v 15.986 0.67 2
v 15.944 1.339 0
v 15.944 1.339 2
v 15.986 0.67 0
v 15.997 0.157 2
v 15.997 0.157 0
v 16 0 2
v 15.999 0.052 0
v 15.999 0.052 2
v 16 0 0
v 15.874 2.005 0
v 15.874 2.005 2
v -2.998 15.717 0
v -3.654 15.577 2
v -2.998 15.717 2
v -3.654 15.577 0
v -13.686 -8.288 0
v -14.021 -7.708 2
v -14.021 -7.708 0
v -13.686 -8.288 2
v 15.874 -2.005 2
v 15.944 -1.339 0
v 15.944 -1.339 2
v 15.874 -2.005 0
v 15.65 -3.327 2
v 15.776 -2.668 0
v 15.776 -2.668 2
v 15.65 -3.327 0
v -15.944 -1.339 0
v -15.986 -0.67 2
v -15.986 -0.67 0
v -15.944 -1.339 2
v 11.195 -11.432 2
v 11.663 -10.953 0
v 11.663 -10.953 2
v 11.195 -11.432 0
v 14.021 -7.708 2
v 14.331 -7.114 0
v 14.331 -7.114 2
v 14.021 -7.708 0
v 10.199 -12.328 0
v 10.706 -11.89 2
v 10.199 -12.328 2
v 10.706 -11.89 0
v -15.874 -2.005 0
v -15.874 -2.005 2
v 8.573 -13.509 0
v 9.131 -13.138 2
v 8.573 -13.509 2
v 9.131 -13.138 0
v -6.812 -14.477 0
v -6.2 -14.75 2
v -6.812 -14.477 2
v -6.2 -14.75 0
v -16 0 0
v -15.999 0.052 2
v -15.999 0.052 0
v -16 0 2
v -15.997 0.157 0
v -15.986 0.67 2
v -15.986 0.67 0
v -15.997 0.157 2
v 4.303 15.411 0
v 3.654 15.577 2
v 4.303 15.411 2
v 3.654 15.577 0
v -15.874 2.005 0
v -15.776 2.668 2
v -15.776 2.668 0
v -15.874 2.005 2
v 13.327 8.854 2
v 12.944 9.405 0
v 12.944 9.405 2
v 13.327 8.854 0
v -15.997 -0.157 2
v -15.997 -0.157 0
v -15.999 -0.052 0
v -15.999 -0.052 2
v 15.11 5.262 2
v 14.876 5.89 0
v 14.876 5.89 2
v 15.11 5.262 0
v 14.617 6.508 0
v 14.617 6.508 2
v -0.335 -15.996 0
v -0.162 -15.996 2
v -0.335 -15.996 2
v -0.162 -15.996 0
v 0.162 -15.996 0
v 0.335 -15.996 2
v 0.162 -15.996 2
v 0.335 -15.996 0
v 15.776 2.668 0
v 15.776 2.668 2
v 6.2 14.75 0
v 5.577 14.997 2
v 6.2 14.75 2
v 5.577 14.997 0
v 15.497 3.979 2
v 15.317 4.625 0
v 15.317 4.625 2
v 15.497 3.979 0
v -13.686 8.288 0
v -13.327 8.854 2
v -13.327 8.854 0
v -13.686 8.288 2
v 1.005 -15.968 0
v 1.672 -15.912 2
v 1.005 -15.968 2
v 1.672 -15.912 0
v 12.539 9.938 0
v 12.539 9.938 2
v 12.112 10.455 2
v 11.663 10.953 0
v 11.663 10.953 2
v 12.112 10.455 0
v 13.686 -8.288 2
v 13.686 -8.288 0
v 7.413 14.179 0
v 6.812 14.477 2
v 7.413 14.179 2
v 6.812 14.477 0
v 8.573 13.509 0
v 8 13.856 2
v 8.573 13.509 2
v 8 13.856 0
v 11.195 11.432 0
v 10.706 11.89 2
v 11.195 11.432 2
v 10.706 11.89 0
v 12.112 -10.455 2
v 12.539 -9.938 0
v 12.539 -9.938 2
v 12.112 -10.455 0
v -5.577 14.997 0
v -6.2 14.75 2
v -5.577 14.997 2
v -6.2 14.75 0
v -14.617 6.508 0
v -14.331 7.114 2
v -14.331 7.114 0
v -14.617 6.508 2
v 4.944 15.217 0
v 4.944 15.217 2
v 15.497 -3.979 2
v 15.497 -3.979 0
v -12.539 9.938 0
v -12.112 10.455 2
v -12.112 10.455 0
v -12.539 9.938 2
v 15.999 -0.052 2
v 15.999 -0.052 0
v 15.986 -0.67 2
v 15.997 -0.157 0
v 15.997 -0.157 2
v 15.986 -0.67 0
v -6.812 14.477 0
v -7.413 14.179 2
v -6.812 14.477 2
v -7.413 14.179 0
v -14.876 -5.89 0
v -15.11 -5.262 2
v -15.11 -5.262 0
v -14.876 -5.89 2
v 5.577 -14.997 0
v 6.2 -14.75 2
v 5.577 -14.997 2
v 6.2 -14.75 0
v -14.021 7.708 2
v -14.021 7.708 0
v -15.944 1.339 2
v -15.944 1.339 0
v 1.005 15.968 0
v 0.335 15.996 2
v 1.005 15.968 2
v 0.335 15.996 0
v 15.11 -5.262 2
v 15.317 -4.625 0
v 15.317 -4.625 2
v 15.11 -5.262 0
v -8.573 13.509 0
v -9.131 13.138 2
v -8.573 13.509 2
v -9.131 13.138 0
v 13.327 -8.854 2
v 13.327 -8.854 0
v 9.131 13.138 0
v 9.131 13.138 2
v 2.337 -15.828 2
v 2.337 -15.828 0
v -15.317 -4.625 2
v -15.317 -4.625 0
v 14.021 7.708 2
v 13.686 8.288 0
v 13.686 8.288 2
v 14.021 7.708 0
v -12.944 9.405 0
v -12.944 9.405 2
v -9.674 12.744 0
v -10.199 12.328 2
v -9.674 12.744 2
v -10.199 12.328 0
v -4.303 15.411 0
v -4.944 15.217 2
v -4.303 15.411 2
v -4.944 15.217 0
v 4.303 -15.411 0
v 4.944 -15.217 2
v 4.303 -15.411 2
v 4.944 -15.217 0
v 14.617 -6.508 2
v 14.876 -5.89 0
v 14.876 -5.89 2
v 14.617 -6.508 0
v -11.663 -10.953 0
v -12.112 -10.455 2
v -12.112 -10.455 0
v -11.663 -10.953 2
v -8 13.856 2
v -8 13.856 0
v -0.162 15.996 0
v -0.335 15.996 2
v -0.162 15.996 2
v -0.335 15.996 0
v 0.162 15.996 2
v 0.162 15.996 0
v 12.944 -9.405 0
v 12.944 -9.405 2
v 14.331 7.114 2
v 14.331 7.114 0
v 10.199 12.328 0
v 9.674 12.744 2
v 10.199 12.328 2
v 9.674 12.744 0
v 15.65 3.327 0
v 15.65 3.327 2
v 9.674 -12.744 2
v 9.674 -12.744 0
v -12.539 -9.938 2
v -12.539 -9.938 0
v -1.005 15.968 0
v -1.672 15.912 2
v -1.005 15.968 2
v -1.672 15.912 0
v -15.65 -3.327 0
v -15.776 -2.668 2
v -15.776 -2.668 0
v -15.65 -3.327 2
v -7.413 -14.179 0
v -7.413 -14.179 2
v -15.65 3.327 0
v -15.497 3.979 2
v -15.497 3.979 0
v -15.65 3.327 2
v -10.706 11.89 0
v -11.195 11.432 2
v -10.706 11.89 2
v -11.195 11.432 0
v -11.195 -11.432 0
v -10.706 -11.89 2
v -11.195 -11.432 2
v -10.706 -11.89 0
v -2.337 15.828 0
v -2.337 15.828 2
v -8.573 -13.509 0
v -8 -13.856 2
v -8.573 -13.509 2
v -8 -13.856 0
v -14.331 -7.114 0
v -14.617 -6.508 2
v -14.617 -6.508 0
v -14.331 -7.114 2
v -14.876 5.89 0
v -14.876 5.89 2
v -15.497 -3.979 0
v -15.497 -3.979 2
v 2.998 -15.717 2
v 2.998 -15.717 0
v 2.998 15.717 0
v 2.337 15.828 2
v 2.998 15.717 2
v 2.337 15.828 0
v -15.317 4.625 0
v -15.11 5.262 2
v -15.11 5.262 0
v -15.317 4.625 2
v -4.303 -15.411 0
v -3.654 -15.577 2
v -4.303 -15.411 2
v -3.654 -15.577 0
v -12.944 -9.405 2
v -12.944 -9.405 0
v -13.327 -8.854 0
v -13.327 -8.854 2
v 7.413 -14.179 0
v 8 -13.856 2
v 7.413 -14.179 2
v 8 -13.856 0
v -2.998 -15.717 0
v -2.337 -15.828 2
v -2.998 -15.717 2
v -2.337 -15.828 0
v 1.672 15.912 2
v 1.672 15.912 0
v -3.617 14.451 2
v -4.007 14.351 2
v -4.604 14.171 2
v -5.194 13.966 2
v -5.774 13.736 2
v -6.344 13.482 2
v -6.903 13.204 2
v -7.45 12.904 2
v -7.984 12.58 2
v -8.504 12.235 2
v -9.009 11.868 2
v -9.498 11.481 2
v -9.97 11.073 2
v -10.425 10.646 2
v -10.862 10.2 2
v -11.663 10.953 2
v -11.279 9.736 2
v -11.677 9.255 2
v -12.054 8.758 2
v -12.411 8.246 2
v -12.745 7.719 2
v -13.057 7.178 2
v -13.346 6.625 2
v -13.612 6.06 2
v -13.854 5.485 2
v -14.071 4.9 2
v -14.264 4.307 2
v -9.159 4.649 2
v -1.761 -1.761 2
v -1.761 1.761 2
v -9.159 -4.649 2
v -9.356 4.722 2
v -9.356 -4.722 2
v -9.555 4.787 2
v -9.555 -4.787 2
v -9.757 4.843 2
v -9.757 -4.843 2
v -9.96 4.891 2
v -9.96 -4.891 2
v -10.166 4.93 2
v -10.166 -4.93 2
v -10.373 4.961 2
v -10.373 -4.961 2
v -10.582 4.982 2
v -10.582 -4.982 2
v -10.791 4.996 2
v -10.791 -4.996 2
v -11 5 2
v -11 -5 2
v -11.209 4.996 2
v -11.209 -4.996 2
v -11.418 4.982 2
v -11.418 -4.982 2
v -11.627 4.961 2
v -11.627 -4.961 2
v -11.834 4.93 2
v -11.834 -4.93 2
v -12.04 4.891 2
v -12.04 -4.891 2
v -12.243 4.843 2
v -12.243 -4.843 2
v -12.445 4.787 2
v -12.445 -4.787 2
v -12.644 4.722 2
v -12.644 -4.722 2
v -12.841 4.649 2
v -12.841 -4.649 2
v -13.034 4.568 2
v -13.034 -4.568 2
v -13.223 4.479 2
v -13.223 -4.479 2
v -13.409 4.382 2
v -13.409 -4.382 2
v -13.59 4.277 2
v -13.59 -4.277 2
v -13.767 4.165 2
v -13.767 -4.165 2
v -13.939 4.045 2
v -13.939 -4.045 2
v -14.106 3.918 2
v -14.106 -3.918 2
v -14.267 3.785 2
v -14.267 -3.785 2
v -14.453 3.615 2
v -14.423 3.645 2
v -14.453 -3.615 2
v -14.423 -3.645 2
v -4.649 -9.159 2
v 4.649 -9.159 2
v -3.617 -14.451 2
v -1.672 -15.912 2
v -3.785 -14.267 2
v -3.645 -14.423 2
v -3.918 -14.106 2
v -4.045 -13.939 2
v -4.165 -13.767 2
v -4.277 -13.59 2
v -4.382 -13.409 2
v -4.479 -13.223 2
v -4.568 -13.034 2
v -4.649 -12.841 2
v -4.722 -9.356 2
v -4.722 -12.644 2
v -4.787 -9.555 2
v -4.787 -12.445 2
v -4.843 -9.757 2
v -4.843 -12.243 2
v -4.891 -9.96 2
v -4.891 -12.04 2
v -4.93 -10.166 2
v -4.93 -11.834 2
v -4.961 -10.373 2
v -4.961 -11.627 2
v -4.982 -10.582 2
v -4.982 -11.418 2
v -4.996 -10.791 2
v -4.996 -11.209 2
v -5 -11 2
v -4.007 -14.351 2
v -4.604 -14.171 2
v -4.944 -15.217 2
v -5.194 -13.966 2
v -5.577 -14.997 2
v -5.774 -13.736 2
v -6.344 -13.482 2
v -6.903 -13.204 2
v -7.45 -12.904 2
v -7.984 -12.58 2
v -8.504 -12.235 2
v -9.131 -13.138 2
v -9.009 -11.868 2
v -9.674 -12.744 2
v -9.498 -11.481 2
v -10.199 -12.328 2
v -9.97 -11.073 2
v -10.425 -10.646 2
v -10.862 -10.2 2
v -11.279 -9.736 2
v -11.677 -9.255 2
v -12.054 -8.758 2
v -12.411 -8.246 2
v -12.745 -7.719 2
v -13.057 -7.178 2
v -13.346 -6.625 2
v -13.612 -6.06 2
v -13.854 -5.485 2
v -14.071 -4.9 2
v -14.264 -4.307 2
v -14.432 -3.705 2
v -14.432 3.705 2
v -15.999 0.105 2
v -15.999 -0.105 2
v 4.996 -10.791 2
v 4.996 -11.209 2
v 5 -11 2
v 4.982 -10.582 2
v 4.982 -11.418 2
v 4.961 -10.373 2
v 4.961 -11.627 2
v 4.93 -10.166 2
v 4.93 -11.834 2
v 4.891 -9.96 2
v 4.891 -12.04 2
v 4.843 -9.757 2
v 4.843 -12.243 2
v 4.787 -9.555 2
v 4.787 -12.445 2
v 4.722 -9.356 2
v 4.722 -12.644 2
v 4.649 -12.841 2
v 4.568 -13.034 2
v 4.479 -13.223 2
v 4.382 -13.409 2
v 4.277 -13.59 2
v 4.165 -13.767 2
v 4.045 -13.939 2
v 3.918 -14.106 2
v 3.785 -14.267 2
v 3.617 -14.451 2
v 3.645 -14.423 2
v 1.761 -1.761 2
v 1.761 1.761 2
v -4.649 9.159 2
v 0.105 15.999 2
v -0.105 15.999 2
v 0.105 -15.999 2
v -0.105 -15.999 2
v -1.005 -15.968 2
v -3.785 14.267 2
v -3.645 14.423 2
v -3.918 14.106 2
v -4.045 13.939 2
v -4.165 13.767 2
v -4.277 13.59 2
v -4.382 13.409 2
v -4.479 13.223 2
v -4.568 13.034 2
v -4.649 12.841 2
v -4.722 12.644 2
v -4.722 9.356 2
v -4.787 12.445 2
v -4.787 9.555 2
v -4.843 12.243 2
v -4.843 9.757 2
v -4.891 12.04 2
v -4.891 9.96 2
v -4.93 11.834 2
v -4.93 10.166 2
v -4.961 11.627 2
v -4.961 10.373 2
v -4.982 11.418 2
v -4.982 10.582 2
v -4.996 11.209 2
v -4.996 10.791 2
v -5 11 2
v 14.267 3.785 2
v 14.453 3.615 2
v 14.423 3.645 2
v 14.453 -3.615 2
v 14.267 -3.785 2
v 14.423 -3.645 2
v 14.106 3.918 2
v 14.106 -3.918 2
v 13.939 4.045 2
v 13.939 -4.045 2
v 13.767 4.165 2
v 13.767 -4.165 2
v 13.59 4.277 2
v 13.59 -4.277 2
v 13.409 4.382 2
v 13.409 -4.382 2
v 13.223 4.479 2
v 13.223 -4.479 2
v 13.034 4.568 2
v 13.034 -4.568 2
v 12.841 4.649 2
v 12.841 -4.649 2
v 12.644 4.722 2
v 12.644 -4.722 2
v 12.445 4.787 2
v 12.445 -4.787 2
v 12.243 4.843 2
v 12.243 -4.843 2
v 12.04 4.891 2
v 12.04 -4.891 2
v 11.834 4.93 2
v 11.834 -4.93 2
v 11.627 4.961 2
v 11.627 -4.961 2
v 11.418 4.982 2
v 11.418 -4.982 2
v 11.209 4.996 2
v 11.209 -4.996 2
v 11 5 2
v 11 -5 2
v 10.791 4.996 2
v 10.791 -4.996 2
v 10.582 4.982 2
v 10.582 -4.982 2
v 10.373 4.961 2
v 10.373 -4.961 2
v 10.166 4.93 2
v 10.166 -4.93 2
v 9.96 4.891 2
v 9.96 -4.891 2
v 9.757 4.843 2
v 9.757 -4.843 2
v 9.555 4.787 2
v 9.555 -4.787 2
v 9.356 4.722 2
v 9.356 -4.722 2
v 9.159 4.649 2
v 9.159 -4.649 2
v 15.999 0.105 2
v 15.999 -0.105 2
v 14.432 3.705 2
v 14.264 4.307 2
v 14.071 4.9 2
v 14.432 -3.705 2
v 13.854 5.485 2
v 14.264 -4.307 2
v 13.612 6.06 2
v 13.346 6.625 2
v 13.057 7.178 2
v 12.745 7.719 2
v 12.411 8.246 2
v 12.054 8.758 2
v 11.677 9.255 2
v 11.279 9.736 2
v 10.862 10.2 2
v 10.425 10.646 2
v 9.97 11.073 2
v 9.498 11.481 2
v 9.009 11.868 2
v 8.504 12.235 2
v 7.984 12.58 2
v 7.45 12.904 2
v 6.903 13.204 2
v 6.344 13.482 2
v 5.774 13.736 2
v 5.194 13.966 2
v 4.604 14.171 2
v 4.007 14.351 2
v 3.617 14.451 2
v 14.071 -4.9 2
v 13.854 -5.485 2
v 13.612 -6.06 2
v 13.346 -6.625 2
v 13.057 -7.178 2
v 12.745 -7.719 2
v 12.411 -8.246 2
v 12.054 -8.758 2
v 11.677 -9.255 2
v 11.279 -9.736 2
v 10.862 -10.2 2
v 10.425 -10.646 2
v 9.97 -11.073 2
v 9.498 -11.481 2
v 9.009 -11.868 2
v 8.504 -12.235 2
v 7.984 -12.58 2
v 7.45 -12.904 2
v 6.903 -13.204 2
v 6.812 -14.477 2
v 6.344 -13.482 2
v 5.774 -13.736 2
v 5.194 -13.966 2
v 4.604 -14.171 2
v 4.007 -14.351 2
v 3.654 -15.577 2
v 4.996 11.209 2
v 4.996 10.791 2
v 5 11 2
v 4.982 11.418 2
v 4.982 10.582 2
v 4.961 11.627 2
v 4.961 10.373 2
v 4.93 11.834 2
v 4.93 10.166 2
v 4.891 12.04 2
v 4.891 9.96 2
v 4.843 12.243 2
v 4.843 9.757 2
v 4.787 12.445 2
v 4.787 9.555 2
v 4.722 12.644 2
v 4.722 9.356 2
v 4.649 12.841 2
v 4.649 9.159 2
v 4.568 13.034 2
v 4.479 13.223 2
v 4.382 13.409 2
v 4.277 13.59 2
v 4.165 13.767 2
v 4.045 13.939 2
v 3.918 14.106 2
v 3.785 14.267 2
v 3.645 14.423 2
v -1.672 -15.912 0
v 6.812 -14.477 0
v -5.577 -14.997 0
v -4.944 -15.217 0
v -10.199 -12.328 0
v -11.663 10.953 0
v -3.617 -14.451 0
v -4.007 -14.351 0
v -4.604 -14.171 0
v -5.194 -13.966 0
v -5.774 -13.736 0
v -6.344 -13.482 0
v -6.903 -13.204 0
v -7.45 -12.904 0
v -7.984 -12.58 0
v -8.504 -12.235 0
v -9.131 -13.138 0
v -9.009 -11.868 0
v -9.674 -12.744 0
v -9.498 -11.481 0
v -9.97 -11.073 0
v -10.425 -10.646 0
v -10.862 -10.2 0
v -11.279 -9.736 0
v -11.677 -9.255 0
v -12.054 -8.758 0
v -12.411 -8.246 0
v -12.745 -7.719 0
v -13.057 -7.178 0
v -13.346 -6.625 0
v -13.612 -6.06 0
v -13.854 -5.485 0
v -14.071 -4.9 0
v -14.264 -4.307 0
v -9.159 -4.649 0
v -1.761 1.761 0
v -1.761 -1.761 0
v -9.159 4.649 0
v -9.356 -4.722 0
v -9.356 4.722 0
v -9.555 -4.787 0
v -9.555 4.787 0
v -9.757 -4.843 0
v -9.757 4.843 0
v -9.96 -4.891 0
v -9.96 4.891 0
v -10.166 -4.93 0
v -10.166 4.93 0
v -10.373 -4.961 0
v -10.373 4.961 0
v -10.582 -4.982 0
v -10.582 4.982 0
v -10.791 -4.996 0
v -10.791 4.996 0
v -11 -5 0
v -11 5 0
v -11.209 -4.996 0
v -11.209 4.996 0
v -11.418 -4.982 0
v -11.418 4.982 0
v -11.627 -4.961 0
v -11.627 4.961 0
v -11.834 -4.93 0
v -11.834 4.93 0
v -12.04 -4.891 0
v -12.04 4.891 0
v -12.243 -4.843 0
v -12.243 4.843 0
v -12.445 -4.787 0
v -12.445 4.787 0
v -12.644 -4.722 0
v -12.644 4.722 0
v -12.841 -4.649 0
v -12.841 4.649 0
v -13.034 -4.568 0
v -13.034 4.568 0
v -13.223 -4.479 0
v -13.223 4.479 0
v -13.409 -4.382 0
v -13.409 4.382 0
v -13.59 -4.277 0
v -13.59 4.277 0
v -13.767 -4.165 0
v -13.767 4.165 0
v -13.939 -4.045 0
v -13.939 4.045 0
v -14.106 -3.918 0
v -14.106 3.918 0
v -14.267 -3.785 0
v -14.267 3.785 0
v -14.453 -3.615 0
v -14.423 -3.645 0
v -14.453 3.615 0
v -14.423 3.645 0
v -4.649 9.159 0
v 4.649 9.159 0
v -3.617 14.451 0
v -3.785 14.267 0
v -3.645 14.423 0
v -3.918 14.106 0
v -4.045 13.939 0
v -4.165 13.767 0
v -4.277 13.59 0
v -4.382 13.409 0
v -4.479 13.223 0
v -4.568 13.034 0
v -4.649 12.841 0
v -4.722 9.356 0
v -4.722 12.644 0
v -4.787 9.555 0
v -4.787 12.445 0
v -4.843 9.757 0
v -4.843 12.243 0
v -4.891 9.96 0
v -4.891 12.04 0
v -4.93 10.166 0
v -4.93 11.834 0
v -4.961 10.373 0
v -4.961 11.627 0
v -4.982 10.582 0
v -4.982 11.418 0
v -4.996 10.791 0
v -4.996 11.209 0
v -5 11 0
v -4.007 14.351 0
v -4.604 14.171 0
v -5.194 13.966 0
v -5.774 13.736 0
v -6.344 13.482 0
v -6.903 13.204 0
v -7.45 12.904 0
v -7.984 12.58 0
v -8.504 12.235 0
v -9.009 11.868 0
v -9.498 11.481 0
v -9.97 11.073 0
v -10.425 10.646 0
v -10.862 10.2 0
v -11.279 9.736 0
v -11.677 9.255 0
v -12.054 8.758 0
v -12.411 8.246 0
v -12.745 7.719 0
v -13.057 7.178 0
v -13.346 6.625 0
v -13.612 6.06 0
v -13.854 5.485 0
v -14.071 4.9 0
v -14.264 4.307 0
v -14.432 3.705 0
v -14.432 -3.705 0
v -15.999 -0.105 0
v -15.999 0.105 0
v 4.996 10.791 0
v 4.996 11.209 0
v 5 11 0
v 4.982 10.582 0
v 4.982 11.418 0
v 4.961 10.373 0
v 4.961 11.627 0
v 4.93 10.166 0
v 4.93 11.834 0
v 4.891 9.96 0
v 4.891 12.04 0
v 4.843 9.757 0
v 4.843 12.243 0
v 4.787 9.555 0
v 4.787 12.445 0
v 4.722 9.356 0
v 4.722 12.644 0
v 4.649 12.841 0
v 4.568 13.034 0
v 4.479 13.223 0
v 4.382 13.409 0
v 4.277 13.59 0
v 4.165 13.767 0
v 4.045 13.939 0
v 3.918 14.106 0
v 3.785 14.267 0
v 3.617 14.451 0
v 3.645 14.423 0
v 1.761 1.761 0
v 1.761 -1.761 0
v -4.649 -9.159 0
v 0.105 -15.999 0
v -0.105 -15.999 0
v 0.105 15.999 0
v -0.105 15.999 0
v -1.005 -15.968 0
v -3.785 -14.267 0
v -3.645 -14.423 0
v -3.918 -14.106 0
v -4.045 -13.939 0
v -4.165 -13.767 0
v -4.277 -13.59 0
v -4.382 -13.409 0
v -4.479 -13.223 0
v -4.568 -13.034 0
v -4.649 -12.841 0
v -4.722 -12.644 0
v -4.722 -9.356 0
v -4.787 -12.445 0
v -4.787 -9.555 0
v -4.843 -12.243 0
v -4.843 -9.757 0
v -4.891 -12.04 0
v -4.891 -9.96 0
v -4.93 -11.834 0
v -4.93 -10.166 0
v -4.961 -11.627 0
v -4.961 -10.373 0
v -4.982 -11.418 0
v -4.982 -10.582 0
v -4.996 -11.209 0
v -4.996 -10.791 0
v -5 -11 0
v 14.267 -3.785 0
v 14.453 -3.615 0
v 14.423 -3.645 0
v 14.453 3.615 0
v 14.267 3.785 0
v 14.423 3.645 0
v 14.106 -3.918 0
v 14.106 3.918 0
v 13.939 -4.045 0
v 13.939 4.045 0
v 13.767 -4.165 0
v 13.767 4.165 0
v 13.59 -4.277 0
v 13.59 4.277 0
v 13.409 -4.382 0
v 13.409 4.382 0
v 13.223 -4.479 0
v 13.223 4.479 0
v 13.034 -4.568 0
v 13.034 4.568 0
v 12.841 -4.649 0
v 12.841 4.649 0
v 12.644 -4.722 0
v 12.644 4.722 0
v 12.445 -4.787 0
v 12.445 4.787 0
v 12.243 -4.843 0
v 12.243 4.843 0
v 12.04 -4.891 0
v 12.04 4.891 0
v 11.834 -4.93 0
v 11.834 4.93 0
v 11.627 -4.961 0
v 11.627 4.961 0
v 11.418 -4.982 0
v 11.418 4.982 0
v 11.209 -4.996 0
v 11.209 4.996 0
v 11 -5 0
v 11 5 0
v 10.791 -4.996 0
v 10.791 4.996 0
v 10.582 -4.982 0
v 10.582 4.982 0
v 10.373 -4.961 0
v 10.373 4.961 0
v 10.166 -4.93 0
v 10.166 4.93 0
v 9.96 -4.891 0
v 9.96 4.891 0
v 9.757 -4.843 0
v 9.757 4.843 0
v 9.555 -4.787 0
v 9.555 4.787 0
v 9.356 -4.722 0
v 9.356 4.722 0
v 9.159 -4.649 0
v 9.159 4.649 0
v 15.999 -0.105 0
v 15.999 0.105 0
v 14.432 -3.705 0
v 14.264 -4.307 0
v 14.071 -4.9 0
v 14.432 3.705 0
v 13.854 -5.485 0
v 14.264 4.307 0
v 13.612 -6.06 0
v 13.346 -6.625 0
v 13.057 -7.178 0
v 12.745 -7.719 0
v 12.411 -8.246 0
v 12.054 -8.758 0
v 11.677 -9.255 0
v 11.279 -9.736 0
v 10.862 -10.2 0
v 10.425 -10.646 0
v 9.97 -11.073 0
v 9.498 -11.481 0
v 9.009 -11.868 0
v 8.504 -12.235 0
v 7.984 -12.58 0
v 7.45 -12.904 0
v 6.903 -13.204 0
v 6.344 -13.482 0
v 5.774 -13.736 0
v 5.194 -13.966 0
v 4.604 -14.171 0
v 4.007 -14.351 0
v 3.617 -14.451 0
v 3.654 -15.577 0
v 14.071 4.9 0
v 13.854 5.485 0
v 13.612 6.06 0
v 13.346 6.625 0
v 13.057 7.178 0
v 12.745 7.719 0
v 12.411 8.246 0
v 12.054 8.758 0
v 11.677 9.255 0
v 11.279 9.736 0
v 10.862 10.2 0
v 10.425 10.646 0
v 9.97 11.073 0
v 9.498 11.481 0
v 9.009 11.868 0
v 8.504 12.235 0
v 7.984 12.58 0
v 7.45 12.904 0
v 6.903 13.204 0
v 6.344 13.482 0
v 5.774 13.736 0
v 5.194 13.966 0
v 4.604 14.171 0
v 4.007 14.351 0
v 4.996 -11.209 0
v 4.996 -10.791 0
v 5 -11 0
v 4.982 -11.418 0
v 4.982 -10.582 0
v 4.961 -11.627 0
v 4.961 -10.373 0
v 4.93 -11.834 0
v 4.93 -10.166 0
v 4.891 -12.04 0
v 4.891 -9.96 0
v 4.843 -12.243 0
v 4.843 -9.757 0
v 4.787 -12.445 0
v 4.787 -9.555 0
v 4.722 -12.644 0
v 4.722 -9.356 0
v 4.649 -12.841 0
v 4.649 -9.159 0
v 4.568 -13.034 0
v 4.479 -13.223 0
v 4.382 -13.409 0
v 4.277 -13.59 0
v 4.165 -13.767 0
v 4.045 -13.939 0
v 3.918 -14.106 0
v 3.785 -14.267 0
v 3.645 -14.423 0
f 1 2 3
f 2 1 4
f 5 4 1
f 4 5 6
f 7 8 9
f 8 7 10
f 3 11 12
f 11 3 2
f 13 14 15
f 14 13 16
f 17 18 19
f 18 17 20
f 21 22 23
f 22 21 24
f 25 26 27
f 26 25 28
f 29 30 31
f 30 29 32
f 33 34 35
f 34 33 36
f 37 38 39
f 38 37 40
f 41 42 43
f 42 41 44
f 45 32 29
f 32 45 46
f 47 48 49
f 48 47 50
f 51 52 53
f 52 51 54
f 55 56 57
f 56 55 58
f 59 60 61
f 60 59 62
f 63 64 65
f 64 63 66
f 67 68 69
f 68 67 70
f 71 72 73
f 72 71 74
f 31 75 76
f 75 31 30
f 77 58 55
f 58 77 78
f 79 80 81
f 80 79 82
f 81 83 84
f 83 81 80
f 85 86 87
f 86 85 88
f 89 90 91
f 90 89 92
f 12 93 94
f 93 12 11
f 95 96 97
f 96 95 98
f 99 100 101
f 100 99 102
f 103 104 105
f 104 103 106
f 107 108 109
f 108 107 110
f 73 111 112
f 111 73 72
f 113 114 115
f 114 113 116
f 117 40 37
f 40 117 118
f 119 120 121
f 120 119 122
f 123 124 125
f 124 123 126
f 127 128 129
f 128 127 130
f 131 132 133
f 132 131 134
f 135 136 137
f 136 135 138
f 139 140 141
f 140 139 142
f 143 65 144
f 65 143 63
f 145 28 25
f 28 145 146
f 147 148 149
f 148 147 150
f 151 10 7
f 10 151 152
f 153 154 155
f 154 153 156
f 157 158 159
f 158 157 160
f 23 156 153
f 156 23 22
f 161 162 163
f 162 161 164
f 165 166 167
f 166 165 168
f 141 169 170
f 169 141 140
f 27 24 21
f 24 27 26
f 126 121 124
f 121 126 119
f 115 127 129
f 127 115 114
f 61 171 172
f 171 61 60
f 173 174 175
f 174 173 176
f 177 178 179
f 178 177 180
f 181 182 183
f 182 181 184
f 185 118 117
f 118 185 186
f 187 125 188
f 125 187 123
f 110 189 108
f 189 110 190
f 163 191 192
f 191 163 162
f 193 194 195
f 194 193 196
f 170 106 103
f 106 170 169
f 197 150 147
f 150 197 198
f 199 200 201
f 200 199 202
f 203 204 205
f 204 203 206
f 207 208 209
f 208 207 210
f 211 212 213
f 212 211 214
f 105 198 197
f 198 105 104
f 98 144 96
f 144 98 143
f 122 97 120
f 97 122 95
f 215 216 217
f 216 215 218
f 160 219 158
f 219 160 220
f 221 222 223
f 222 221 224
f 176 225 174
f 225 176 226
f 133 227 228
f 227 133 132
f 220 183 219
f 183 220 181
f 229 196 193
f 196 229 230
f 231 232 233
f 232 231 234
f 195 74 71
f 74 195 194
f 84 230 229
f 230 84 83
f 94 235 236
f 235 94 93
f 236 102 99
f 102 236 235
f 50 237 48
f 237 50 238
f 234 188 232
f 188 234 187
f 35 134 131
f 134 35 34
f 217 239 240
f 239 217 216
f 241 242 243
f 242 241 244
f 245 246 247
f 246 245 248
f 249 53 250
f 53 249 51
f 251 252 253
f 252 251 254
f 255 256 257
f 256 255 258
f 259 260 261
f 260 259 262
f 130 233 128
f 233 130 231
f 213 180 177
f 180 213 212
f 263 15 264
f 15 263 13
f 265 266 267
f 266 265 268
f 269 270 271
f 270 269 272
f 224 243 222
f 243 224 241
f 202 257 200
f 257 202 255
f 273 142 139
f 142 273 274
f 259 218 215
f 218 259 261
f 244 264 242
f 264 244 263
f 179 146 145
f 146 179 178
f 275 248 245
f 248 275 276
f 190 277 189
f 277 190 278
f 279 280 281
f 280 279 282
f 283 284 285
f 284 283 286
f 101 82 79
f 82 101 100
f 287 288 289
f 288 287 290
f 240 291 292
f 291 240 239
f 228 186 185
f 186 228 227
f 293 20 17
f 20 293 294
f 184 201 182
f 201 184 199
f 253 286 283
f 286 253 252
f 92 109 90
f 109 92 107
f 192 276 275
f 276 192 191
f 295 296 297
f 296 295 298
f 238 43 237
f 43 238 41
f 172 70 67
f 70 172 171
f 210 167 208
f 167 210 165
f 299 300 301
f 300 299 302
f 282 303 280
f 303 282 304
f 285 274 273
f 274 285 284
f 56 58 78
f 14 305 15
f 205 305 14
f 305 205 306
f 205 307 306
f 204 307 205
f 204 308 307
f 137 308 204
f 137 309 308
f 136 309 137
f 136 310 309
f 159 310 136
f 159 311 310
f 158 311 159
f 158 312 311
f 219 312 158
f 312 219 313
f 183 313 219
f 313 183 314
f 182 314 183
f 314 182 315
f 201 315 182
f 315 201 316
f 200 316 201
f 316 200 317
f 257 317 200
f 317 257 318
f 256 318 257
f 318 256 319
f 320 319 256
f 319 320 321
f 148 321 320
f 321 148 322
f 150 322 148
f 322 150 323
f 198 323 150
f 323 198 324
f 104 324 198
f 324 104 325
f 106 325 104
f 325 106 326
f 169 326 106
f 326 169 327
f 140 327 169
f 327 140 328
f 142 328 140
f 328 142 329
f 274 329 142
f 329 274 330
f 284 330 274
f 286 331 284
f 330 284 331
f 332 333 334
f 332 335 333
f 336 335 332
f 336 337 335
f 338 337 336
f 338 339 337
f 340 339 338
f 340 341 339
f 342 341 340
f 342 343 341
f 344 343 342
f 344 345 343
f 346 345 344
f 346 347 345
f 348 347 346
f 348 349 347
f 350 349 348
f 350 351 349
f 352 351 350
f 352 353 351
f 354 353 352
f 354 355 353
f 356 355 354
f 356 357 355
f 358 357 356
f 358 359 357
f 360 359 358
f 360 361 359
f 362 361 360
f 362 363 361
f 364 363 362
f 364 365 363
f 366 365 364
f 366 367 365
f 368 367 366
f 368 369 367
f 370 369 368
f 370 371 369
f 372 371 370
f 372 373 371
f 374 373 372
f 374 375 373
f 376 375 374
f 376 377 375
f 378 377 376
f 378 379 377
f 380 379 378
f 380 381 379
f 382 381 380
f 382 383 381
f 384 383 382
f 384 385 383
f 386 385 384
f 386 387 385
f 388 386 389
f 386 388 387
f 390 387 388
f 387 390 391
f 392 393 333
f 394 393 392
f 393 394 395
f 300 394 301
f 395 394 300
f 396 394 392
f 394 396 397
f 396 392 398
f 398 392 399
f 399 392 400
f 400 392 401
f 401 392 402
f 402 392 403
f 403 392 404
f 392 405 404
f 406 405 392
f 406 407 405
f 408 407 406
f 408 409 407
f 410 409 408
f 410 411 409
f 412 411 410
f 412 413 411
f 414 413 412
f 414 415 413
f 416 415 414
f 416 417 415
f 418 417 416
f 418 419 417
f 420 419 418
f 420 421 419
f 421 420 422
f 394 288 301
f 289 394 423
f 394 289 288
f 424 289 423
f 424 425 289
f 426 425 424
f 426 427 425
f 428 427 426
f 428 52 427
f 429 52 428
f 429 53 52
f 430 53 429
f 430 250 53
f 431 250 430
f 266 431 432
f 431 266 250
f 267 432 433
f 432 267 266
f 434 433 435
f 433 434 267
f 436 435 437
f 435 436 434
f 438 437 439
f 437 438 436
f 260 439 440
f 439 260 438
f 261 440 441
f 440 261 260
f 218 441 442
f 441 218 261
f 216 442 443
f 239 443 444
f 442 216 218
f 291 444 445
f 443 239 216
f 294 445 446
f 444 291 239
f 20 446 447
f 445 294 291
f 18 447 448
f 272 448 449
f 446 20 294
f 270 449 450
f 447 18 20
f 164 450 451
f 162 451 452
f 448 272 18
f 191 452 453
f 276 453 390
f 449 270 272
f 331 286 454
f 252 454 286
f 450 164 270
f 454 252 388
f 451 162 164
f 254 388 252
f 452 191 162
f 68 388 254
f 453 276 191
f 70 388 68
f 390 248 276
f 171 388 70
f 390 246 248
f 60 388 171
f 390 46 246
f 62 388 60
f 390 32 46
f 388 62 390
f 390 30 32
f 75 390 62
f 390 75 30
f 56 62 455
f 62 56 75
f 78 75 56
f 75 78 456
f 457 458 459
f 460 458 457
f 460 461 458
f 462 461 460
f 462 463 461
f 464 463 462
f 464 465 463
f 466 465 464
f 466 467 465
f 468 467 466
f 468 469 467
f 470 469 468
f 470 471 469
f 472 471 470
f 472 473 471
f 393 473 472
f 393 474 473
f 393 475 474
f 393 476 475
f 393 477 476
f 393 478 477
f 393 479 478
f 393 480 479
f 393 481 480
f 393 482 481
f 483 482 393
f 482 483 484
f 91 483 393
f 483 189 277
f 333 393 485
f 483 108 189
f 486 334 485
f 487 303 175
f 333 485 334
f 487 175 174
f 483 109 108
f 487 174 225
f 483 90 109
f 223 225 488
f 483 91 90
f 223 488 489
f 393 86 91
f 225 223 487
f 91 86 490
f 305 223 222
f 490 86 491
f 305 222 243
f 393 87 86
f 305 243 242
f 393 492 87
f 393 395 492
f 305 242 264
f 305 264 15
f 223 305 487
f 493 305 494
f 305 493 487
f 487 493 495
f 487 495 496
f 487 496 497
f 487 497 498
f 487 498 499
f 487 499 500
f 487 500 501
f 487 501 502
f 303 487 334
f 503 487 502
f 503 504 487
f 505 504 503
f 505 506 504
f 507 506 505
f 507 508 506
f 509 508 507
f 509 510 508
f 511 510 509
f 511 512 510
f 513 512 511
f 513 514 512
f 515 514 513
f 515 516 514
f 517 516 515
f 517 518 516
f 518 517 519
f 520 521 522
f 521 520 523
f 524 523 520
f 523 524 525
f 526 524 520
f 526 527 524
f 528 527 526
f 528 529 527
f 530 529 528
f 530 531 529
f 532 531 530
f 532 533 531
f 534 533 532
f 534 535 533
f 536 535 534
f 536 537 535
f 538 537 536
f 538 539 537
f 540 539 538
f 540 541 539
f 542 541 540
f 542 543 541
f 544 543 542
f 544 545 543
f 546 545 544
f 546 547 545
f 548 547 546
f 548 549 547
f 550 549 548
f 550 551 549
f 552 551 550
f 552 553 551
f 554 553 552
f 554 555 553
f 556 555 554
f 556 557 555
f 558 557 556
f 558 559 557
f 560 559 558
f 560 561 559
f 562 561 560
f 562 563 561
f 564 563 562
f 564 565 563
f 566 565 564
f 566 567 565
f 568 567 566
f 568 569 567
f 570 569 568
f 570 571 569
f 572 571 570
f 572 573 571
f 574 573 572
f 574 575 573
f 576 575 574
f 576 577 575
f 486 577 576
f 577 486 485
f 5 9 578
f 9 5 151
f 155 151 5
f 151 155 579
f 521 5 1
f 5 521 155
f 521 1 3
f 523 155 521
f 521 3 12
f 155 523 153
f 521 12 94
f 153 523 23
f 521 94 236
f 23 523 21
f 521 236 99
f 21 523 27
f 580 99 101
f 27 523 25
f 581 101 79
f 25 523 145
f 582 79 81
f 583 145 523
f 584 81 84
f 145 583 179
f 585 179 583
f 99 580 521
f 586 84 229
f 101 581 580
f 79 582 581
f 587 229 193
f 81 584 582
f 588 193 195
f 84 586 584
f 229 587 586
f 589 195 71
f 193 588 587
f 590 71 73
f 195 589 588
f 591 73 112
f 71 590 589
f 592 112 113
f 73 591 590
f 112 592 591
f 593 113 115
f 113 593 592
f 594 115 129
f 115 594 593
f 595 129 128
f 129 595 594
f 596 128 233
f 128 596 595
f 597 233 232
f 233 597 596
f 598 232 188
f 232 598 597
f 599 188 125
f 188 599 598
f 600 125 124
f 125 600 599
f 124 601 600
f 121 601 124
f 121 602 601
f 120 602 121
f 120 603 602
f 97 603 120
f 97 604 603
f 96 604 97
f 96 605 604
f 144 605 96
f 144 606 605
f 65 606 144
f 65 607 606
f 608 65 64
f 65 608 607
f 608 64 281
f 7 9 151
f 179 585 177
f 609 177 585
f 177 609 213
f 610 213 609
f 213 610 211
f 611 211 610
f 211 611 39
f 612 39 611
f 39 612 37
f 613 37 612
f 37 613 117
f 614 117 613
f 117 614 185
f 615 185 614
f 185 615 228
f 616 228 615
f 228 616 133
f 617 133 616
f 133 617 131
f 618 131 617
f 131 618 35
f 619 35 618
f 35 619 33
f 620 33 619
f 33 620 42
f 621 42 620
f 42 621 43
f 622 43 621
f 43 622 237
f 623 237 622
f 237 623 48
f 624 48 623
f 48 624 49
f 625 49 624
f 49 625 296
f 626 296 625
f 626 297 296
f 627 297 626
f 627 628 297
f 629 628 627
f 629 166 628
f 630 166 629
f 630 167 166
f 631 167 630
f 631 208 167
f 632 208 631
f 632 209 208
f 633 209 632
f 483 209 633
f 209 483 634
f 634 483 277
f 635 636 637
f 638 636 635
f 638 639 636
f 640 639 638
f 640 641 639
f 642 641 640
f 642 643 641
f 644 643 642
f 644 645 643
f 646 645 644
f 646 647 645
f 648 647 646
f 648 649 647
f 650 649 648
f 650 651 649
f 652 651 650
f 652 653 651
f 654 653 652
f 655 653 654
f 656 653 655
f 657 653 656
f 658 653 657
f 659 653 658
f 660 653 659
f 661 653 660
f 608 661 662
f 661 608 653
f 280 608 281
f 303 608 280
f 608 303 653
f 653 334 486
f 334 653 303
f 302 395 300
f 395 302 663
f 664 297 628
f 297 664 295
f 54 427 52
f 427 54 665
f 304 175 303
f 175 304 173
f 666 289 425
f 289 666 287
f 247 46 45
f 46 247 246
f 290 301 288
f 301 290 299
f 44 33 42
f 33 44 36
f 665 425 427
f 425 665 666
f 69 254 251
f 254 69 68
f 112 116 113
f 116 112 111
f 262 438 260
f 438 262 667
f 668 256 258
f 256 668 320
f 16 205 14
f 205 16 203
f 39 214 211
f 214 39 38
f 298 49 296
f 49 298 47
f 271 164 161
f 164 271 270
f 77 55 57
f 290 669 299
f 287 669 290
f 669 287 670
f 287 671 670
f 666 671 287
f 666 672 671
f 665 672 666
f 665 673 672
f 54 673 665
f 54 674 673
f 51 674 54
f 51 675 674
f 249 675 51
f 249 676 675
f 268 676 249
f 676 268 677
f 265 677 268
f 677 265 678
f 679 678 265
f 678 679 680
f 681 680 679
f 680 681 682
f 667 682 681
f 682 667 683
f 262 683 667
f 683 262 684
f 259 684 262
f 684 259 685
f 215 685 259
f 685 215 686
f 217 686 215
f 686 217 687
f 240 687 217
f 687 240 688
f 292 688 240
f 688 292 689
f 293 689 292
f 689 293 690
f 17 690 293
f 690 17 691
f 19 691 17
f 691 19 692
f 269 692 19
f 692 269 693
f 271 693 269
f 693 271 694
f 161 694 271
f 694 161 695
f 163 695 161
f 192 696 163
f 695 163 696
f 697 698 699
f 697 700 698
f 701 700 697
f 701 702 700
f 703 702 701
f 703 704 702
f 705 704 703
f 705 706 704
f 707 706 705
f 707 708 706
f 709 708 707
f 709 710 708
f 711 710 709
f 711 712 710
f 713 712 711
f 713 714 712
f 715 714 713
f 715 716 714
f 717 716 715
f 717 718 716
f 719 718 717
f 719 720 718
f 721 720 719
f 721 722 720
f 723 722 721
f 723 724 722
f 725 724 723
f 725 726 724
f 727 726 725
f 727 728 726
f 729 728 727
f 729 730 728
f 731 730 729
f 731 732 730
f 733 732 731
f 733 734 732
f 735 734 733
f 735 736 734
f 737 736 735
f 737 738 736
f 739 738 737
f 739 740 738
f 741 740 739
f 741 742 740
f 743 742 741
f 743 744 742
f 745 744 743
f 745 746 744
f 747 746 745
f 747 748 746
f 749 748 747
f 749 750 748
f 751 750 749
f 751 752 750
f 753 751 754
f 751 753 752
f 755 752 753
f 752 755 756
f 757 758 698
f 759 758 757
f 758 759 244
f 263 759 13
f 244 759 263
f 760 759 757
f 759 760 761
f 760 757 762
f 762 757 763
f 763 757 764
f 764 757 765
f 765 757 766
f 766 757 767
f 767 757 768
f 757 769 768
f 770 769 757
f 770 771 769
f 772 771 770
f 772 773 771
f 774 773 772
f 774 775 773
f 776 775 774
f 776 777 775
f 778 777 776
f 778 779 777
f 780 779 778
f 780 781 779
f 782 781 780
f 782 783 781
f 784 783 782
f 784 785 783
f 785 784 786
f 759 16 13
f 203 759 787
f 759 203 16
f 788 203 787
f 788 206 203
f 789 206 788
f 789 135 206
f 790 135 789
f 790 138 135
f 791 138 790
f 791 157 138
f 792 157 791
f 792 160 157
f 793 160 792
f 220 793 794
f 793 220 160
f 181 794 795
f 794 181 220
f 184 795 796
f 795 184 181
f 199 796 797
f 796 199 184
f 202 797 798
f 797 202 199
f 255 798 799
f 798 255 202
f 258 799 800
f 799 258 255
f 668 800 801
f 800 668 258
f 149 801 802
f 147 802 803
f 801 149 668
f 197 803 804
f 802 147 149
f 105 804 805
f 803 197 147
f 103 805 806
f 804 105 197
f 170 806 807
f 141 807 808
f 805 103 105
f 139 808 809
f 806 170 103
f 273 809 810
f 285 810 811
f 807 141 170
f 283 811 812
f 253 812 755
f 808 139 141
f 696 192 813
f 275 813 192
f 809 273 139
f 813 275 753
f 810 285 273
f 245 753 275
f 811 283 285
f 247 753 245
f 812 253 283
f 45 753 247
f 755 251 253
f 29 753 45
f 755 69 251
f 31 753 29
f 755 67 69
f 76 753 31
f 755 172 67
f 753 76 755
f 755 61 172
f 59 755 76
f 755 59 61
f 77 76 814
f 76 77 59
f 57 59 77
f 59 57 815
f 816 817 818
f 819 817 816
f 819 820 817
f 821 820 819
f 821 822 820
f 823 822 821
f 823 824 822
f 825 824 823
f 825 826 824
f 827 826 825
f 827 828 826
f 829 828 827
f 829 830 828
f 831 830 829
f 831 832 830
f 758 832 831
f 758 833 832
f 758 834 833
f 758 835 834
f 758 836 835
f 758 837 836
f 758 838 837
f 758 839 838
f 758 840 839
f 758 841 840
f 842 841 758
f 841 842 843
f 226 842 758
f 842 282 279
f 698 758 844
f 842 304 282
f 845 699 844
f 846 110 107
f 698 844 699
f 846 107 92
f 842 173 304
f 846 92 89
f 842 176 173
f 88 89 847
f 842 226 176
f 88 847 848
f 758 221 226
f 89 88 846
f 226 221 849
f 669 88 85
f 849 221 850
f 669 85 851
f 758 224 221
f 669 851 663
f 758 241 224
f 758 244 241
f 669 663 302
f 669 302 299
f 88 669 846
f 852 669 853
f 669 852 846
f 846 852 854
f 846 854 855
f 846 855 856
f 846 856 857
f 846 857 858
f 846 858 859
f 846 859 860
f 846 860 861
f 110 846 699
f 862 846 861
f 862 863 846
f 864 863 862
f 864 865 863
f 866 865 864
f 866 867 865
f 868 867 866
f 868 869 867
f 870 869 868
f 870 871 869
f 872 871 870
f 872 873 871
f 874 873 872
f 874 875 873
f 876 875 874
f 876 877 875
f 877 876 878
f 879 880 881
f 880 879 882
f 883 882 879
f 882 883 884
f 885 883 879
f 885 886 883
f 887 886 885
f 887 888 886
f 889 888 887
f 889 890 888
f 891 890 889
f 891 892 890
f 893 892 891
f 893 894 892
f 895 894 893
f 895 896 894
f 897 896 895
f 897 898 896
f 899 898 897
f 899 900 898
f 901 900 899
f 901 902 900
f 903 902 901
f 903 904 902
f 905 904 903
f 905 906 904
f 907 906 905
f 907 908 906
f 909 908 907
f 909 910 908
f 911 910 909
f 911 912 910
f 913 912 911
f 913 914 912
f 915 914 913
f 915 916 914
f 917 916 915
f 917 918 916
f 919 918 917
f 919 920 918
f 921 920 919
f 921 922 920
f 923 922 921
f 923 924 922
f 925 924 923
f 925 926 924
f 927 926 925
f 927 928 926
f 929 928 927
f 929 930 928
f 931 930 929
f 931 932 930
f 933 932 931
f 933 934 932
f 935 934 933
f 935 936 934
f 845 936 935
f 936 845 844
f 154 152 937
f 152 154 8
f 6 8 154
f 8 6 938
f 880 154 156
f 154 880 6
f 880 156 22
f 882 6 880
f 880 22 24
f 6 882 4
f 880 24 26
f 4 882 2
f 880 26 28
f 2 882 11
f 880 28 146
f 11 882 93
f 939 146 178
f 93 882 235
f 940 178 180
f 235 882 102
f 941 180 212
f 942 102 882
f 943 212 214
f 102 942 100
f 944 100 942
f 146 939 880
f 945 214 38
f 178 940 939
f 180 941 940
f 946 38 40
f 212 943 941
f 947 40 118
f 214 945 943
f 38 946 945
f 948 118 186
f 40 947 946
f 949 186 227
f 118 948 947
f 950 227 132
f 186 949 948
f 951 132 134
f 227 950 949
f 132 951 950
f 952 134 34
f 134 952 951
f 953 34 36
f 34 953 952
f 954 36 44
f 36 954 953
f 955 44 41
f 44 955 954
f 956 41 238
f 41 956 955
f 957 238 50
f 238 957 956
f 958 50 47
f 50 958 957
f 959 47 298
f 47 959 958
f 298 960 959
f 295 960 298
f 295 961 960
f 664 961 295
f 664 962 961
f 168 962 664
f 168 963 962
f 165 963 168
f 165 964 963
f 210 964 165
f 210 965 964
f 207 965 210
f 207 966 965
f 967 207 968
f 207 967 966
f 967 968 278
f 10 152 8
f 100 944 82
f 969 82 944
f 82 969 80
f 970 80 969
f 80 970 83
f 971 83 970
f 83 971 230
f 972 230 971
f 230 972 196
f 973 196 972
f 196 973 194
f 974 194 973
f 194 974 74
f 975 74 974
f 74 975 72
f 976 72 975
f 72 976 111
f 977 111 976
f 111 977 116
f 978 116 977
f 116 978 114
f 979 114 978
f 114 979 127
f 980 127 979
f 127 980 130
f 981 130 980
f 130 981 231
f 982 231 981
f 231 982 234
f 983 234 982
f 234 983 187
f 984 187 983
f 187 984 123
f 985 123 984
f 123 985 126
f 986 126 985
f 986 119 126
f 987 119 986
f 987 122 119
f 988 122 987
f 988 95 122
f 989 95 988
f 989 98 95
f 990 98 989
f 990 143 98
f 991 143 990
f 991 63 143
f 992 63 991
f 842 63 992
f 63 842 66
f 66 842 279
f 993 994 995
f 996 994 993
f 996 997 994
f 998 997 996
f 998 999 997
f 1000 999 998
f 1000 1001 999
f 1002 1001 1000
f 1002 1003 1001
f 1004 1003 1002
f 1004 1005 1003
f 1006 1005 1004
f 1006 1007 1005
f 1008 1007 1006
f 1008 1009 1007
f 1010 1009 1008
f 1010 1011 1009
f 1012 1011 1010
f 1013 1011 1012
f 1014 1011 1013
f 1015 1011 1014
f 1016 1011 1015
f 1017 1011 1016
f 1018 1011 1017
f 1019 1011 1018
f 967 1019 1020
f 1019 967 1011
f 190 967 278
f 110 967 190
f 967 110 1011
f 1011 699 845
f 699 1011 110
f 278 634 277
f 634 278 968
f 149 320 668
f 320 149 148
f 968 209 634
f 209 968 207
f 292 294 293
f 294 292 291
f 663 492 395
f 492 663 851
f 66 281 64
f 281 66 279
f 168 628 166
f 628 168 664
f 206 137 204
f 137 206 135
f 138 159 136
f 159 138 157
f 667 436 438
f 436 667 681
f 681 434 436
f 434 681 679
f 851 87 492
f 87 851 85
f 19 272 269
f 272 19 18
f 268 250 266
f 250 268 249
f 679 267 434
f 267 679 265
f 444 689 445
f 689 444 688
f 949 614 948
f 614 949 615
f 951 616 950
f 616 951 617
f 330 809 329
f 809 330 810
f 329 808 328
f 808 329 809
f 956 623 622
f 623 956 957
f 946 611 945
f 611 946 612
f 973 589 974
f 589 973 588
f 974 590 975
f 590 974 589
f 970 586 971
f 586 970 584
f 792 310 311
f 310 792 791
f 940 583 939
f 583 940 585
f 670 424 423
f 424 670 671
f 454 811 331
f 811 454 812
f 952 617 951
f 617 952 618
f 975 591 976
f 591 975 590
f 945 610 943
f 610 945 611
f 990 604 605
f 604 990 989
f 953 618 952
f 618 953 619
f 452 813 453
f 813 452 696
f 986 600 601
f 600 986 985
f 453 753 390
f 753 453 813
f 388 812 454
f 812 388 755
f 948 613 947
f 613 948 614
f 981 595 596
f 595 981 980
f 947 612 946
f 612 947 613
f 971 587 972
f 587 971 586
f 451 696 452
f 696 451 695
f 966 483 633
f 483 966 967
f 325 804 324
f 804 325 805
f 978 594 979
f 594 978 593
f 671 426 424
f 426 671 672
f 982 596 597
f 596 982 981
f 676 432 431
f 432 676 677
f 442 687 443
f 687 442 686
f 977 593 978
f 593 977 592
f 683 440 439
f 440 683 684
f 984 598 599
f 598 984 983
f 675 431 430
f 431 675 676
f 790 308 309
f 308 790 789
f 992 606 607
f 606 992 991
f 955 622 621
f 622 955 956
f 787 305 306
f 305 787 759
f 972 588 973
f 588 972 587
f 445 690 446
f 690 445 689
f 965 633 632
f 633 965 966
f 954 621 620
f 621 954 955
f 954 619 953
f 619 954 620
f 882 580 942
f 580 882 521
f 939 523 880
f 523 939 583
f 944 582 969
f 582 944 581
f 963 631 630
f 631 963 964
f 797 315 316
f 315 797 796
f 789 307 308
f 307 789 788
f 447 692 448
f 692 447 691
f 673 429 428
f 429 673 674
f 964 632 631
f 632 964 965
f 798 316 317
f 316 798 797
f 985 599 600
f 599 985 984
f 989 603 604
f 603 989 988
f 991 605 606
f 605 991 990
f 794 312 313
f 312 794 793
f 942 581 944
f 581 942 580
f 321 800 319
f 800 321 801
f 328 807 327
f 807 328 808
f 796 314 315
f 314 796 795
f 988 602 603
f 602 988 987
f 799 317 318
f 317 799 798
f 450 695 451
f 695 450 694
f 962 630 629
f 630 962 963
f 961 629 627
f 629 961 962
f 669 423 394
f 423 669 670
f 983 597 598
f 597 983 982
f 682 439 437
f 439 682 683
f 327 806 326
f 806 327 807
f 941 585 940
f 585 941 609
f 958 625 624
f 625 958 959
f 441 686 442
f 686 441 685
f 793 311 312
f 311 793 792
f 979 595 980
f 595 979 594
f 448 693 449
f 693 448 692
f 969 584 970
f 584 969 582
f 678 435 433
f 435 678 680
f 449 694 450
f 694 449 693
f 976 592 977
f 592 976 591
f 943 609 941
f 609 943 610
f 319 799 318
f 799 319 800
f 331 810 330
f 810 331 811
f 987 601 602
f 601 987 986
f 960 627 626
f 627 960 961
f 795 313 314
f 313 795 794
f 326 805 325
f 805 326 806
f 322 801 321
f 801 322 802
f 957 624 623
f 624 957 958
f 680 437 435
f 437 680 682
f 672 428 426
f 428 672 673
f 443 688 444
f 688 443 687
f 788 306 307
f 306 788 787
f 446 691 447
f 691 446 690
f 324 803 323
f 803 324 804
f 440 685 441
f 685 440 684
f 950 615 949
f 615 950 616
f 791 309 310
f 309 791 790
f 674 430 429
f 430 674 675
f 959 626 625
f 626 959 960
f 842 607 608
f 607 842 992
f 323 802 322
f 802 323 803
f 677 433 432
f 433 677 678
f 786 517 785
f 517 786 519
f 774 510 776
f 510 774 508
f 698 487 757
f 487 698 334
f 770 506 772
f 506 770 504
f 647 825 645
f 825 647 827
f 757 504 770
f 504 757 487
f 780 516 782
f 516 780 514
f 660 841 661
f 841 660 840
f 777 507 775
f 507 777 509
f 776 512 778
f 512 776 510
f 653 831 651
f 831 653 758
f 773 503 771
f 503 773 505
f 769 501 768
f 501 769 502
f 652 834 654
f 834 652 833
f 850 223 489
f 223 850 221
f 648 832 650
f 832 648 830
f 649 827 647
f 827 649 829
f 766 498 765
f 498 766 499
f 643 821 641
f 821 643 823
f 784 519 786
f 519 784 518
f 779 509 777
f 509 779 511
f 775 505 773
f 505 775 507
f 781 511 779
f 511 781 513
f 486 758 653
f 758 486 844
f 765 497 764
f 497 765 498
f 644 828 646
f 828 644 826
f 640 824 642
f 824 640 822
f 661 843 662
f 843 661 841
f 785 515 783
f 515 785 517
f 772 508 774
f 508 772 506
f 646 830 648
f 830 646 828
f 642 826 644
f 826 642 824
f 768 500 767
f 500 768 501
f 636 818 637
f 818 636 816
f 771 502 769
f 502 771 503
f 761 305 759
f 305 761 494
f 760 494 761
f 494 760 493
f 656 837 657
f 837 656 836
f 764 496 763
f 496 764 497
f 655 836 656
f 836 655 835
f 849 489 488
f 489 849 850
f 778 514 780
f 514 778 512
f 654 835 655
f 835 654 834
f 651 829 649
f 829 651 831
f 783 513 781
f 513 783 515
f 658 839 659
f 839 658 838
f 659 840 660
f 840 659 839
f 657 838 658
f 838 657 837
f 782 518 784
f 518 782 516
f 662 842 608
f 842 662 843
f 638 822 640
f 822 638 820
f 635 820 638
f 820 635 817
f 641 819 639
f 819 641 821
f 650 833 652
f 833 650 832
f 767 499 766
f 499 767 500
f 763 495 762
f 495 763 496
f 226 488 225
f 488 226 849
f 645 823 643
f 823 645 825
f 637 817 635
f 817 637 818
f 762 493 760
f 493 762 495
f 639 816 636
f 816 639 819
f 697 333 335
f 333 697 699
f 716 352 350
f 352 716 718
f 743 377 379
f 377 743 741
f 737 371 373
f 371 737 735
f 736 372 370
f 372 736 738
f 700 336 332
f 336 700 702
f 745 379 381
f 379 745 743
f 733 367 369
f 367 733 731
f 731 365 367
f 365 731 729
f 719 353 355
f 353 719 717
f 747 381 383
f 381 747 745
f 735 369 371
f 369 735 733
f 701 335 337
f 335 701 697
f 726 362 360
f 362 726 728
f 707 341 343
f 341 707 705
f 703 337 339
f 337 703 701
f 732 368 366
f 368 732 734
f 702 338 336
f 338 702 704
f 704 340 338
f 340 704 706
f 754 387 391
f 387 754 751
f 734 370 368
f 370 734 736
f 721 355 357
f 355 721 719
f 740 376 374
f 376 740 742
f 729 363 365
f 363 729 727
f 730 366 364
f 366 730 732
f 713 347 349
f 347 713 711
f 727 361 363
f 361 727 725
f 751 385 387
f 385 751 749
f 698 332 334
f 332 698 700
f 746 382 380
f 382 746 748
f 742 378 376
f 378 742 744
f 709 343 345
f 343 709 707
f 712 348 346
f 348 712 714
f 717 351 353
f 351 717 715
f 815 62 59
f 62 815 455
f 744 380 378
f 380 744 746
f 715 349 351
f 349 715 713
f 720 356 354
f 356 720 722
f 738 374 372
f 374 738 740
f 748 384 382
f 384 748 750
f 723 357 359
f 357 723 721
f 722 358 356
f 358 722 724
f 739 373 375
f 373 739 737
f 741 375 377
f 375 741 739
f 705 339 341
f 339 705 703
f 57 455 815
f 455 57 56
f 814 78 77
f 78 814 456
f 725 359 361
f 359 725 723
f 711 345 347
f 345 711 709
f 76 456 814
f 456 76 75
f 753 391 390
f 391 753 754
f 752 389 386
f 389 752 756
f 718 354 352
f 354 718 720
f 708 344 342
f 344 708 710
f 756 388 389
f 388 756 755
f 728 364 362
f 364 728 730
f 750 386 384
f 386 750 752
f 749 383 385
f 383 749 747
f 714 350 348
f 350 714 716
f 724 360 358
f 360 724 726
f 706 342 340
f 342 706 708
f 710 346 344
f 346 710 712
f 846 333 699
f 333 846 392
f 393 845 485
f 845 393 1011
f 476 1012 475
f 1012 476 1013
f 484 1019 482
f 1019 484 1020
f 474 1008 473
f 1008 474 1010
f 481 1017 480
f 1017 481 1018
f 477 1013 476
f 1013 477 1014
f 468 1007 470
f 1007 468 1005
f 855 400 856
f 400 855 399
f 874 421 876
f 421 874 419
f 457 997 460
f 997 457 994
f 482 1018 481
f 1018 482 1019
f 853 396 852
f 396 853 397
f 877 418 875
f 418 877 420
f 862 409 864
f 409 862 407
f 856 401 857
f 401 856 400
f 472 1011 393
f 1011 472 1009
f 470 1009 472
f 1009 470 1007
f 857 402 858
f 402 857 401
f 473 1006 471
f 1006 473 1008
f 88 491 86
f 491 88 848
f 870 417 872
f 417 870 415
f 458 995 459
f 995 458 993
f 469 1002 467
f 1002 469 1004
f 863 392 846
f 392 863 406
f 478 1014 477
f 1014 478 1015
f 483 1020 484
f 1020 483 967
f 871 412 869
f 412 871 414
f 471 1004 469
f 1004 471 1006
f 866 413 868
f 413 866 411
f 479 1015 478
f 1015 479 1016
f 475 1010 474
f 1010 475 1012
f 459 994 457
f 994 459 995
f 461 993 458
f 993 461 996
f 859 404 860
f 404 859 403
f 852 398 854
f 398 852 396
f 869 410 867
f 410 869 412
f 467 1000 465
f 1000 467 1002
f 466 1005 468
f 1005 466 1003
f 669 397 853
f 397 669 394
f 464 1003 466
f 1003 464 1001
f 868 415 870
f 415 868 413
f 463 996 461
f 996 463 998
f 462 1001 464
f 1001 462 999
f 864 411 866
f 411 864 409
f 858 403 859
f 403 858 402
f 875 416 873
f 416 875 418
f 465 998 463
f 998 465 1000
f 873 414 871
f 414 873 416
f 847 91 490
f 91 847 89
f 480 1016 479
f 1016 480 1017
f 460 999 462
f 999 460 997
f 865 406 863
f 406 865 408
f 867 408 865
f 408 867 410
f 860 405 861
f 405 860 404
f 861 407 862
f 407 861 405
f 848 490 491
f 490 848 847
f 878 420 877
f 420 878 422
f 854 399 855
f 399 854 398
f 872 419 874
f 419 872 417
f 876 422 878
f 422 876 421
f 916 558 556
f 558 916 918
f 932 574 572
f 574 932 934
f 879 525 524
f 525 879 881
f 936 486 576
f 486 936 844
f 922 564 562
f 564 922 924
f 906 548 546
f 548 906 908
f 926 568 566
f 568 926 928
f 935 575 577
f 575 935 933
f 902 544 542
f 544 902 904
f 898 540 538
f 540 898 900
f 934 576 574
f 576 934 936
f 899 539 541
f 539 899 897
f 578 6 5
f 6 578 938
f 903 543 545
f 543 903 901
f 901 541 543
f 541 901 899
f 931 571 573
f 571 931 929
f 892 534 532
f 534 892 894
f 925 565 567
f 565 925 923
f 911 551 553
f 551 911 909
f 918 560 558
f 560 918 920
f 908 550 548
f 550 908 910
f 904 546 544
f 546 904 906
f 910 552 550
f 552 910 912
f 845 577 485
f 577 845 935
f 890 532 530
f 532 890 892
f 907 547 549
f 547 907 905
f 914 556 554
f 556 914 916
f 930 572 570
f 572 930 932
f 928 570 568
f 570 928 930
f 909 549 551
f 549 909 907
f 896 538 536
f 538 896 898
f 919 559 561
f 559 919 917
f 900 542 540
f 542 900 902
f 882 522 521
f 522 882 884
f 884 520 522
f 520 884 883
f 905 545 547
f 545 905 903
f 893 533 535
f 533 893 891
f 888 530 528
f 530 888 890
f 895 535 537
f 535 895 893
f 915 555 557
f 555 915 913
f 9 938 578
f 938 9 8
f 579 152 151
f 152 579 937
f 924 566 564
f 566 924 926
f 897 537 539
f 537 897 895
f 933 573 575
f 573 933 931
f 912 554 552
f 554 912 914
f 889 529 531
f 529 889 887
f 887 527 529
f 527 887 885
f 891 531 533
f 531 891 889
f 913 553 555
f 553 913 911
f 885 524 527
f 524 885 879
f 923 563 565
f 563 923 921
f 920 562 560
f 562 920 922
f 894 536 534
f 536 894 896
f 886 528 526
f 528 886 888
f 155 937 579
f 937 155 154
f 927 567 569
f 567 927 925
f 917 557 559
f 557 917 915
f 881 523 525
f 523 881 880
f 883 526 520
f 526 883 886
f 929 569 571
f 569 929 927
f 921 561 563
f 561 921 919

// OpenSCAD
/* 
 Side Ilumination  Filters v1.0

An open source filter for a costume side ilumiation that can be adapted to any compound microscope.

This 3D file is designed to be the third optical filter for contrast illumination technics made for microscopy enthusiast and professionals.
     
Source :https://github.com/Usuy-Leon/DIY_Dark-Field-Filters

This project is an Open Source project,
by Usuy D. Leon, 2025.03.26
Microscopist, National University of Colombia, Bogota DC,

  */

// // // // // // // // // // // // // // // // // // // // // // // // // //
/*                        - User Parameters -                             */
 
height = 2;                 // Total height of the filter
outer_dia = 32;             // Outer diameter of the main structure
inner_dia = 15;             // Diameter of the light-blocking center cylinder
border_thickness = 2.2;       // Thickness of the outer border
$fn = 150;                  // Resolution

/*                        - Triangle Parameters -                             */
points_R = [
    [13 , 16],
    [2, -3], 
    [0, 0]
];

points_L= [
    [16 , 13],
    [-2, 3], 
    [0, 0]

];
// // // // // // // // // // // // // // // // // // // // // // // // // // 
/*                            - Computed Values -                         */
border_inner_dia = outer_dia - border_thickness; 

// // // // // // // // // // // // // // // // // // // // // // // // // //
/*                            - Modules -                                 */
// Create the extruded triangle directly 
/*  module triangle_R(){
translate([-10, 11, 0]) 
rotate(270)
linear_extrude(height = height) 
    polygon(points_R);
}

/*  module triangle_L(){
translate([-11, -11, 0]) 
rotate(0)
linear_extrude(height = height) 
    polygon(points_L);
}
  */
module donut() {
    difference() {
        cylinder(height, d = 3);
        cylinder(height, d = 1);  // Use computed border diameter
    }
}
module moon(diameter = outer_dia, height) { 
    difference() {
        cylinder(2, d = outer_dia);
        
        // Cut lower half using a cube larger than the cylinder
        translate([0, -outer_dia, 0]) 
            cube([diameter, outer_dia*2, 2]);
    }
}

module outer_ring() {
    difference() {
        cylinder(height, d = outer_dia);
        cylinder(height, d = border_inner_dia);  // Use computed border diameter
    }
}

module bridge() {
  hull() {
    translate([0, 0, 0])  // Match triangle_R position
      rotate(120)
        cylinder(h=height, r=1);  // Anchor point 1
    
    translate([-0,11, 0])  // Match triangle_L position
      rotate(0)
        cylinder(h=height, d=10);  // Anchor point 2
      
  }
}    

/*                            - Main Assembly -                           */
  difference() {
      bridge();
} 
union() {
  //cylinder(height, d = inner_dia);
  bridge();  // Add bridging element
  translate([0, 0, 0]){  
  rotate(90)
  bridge();}
  translate([0, 0, 0]){  
  rotate(180)
  bridge();} 
  translate([0, 0, 0]){  
  rotate(270)
  bridge();} 
  
difference() ;
    outer_ring();
  }
